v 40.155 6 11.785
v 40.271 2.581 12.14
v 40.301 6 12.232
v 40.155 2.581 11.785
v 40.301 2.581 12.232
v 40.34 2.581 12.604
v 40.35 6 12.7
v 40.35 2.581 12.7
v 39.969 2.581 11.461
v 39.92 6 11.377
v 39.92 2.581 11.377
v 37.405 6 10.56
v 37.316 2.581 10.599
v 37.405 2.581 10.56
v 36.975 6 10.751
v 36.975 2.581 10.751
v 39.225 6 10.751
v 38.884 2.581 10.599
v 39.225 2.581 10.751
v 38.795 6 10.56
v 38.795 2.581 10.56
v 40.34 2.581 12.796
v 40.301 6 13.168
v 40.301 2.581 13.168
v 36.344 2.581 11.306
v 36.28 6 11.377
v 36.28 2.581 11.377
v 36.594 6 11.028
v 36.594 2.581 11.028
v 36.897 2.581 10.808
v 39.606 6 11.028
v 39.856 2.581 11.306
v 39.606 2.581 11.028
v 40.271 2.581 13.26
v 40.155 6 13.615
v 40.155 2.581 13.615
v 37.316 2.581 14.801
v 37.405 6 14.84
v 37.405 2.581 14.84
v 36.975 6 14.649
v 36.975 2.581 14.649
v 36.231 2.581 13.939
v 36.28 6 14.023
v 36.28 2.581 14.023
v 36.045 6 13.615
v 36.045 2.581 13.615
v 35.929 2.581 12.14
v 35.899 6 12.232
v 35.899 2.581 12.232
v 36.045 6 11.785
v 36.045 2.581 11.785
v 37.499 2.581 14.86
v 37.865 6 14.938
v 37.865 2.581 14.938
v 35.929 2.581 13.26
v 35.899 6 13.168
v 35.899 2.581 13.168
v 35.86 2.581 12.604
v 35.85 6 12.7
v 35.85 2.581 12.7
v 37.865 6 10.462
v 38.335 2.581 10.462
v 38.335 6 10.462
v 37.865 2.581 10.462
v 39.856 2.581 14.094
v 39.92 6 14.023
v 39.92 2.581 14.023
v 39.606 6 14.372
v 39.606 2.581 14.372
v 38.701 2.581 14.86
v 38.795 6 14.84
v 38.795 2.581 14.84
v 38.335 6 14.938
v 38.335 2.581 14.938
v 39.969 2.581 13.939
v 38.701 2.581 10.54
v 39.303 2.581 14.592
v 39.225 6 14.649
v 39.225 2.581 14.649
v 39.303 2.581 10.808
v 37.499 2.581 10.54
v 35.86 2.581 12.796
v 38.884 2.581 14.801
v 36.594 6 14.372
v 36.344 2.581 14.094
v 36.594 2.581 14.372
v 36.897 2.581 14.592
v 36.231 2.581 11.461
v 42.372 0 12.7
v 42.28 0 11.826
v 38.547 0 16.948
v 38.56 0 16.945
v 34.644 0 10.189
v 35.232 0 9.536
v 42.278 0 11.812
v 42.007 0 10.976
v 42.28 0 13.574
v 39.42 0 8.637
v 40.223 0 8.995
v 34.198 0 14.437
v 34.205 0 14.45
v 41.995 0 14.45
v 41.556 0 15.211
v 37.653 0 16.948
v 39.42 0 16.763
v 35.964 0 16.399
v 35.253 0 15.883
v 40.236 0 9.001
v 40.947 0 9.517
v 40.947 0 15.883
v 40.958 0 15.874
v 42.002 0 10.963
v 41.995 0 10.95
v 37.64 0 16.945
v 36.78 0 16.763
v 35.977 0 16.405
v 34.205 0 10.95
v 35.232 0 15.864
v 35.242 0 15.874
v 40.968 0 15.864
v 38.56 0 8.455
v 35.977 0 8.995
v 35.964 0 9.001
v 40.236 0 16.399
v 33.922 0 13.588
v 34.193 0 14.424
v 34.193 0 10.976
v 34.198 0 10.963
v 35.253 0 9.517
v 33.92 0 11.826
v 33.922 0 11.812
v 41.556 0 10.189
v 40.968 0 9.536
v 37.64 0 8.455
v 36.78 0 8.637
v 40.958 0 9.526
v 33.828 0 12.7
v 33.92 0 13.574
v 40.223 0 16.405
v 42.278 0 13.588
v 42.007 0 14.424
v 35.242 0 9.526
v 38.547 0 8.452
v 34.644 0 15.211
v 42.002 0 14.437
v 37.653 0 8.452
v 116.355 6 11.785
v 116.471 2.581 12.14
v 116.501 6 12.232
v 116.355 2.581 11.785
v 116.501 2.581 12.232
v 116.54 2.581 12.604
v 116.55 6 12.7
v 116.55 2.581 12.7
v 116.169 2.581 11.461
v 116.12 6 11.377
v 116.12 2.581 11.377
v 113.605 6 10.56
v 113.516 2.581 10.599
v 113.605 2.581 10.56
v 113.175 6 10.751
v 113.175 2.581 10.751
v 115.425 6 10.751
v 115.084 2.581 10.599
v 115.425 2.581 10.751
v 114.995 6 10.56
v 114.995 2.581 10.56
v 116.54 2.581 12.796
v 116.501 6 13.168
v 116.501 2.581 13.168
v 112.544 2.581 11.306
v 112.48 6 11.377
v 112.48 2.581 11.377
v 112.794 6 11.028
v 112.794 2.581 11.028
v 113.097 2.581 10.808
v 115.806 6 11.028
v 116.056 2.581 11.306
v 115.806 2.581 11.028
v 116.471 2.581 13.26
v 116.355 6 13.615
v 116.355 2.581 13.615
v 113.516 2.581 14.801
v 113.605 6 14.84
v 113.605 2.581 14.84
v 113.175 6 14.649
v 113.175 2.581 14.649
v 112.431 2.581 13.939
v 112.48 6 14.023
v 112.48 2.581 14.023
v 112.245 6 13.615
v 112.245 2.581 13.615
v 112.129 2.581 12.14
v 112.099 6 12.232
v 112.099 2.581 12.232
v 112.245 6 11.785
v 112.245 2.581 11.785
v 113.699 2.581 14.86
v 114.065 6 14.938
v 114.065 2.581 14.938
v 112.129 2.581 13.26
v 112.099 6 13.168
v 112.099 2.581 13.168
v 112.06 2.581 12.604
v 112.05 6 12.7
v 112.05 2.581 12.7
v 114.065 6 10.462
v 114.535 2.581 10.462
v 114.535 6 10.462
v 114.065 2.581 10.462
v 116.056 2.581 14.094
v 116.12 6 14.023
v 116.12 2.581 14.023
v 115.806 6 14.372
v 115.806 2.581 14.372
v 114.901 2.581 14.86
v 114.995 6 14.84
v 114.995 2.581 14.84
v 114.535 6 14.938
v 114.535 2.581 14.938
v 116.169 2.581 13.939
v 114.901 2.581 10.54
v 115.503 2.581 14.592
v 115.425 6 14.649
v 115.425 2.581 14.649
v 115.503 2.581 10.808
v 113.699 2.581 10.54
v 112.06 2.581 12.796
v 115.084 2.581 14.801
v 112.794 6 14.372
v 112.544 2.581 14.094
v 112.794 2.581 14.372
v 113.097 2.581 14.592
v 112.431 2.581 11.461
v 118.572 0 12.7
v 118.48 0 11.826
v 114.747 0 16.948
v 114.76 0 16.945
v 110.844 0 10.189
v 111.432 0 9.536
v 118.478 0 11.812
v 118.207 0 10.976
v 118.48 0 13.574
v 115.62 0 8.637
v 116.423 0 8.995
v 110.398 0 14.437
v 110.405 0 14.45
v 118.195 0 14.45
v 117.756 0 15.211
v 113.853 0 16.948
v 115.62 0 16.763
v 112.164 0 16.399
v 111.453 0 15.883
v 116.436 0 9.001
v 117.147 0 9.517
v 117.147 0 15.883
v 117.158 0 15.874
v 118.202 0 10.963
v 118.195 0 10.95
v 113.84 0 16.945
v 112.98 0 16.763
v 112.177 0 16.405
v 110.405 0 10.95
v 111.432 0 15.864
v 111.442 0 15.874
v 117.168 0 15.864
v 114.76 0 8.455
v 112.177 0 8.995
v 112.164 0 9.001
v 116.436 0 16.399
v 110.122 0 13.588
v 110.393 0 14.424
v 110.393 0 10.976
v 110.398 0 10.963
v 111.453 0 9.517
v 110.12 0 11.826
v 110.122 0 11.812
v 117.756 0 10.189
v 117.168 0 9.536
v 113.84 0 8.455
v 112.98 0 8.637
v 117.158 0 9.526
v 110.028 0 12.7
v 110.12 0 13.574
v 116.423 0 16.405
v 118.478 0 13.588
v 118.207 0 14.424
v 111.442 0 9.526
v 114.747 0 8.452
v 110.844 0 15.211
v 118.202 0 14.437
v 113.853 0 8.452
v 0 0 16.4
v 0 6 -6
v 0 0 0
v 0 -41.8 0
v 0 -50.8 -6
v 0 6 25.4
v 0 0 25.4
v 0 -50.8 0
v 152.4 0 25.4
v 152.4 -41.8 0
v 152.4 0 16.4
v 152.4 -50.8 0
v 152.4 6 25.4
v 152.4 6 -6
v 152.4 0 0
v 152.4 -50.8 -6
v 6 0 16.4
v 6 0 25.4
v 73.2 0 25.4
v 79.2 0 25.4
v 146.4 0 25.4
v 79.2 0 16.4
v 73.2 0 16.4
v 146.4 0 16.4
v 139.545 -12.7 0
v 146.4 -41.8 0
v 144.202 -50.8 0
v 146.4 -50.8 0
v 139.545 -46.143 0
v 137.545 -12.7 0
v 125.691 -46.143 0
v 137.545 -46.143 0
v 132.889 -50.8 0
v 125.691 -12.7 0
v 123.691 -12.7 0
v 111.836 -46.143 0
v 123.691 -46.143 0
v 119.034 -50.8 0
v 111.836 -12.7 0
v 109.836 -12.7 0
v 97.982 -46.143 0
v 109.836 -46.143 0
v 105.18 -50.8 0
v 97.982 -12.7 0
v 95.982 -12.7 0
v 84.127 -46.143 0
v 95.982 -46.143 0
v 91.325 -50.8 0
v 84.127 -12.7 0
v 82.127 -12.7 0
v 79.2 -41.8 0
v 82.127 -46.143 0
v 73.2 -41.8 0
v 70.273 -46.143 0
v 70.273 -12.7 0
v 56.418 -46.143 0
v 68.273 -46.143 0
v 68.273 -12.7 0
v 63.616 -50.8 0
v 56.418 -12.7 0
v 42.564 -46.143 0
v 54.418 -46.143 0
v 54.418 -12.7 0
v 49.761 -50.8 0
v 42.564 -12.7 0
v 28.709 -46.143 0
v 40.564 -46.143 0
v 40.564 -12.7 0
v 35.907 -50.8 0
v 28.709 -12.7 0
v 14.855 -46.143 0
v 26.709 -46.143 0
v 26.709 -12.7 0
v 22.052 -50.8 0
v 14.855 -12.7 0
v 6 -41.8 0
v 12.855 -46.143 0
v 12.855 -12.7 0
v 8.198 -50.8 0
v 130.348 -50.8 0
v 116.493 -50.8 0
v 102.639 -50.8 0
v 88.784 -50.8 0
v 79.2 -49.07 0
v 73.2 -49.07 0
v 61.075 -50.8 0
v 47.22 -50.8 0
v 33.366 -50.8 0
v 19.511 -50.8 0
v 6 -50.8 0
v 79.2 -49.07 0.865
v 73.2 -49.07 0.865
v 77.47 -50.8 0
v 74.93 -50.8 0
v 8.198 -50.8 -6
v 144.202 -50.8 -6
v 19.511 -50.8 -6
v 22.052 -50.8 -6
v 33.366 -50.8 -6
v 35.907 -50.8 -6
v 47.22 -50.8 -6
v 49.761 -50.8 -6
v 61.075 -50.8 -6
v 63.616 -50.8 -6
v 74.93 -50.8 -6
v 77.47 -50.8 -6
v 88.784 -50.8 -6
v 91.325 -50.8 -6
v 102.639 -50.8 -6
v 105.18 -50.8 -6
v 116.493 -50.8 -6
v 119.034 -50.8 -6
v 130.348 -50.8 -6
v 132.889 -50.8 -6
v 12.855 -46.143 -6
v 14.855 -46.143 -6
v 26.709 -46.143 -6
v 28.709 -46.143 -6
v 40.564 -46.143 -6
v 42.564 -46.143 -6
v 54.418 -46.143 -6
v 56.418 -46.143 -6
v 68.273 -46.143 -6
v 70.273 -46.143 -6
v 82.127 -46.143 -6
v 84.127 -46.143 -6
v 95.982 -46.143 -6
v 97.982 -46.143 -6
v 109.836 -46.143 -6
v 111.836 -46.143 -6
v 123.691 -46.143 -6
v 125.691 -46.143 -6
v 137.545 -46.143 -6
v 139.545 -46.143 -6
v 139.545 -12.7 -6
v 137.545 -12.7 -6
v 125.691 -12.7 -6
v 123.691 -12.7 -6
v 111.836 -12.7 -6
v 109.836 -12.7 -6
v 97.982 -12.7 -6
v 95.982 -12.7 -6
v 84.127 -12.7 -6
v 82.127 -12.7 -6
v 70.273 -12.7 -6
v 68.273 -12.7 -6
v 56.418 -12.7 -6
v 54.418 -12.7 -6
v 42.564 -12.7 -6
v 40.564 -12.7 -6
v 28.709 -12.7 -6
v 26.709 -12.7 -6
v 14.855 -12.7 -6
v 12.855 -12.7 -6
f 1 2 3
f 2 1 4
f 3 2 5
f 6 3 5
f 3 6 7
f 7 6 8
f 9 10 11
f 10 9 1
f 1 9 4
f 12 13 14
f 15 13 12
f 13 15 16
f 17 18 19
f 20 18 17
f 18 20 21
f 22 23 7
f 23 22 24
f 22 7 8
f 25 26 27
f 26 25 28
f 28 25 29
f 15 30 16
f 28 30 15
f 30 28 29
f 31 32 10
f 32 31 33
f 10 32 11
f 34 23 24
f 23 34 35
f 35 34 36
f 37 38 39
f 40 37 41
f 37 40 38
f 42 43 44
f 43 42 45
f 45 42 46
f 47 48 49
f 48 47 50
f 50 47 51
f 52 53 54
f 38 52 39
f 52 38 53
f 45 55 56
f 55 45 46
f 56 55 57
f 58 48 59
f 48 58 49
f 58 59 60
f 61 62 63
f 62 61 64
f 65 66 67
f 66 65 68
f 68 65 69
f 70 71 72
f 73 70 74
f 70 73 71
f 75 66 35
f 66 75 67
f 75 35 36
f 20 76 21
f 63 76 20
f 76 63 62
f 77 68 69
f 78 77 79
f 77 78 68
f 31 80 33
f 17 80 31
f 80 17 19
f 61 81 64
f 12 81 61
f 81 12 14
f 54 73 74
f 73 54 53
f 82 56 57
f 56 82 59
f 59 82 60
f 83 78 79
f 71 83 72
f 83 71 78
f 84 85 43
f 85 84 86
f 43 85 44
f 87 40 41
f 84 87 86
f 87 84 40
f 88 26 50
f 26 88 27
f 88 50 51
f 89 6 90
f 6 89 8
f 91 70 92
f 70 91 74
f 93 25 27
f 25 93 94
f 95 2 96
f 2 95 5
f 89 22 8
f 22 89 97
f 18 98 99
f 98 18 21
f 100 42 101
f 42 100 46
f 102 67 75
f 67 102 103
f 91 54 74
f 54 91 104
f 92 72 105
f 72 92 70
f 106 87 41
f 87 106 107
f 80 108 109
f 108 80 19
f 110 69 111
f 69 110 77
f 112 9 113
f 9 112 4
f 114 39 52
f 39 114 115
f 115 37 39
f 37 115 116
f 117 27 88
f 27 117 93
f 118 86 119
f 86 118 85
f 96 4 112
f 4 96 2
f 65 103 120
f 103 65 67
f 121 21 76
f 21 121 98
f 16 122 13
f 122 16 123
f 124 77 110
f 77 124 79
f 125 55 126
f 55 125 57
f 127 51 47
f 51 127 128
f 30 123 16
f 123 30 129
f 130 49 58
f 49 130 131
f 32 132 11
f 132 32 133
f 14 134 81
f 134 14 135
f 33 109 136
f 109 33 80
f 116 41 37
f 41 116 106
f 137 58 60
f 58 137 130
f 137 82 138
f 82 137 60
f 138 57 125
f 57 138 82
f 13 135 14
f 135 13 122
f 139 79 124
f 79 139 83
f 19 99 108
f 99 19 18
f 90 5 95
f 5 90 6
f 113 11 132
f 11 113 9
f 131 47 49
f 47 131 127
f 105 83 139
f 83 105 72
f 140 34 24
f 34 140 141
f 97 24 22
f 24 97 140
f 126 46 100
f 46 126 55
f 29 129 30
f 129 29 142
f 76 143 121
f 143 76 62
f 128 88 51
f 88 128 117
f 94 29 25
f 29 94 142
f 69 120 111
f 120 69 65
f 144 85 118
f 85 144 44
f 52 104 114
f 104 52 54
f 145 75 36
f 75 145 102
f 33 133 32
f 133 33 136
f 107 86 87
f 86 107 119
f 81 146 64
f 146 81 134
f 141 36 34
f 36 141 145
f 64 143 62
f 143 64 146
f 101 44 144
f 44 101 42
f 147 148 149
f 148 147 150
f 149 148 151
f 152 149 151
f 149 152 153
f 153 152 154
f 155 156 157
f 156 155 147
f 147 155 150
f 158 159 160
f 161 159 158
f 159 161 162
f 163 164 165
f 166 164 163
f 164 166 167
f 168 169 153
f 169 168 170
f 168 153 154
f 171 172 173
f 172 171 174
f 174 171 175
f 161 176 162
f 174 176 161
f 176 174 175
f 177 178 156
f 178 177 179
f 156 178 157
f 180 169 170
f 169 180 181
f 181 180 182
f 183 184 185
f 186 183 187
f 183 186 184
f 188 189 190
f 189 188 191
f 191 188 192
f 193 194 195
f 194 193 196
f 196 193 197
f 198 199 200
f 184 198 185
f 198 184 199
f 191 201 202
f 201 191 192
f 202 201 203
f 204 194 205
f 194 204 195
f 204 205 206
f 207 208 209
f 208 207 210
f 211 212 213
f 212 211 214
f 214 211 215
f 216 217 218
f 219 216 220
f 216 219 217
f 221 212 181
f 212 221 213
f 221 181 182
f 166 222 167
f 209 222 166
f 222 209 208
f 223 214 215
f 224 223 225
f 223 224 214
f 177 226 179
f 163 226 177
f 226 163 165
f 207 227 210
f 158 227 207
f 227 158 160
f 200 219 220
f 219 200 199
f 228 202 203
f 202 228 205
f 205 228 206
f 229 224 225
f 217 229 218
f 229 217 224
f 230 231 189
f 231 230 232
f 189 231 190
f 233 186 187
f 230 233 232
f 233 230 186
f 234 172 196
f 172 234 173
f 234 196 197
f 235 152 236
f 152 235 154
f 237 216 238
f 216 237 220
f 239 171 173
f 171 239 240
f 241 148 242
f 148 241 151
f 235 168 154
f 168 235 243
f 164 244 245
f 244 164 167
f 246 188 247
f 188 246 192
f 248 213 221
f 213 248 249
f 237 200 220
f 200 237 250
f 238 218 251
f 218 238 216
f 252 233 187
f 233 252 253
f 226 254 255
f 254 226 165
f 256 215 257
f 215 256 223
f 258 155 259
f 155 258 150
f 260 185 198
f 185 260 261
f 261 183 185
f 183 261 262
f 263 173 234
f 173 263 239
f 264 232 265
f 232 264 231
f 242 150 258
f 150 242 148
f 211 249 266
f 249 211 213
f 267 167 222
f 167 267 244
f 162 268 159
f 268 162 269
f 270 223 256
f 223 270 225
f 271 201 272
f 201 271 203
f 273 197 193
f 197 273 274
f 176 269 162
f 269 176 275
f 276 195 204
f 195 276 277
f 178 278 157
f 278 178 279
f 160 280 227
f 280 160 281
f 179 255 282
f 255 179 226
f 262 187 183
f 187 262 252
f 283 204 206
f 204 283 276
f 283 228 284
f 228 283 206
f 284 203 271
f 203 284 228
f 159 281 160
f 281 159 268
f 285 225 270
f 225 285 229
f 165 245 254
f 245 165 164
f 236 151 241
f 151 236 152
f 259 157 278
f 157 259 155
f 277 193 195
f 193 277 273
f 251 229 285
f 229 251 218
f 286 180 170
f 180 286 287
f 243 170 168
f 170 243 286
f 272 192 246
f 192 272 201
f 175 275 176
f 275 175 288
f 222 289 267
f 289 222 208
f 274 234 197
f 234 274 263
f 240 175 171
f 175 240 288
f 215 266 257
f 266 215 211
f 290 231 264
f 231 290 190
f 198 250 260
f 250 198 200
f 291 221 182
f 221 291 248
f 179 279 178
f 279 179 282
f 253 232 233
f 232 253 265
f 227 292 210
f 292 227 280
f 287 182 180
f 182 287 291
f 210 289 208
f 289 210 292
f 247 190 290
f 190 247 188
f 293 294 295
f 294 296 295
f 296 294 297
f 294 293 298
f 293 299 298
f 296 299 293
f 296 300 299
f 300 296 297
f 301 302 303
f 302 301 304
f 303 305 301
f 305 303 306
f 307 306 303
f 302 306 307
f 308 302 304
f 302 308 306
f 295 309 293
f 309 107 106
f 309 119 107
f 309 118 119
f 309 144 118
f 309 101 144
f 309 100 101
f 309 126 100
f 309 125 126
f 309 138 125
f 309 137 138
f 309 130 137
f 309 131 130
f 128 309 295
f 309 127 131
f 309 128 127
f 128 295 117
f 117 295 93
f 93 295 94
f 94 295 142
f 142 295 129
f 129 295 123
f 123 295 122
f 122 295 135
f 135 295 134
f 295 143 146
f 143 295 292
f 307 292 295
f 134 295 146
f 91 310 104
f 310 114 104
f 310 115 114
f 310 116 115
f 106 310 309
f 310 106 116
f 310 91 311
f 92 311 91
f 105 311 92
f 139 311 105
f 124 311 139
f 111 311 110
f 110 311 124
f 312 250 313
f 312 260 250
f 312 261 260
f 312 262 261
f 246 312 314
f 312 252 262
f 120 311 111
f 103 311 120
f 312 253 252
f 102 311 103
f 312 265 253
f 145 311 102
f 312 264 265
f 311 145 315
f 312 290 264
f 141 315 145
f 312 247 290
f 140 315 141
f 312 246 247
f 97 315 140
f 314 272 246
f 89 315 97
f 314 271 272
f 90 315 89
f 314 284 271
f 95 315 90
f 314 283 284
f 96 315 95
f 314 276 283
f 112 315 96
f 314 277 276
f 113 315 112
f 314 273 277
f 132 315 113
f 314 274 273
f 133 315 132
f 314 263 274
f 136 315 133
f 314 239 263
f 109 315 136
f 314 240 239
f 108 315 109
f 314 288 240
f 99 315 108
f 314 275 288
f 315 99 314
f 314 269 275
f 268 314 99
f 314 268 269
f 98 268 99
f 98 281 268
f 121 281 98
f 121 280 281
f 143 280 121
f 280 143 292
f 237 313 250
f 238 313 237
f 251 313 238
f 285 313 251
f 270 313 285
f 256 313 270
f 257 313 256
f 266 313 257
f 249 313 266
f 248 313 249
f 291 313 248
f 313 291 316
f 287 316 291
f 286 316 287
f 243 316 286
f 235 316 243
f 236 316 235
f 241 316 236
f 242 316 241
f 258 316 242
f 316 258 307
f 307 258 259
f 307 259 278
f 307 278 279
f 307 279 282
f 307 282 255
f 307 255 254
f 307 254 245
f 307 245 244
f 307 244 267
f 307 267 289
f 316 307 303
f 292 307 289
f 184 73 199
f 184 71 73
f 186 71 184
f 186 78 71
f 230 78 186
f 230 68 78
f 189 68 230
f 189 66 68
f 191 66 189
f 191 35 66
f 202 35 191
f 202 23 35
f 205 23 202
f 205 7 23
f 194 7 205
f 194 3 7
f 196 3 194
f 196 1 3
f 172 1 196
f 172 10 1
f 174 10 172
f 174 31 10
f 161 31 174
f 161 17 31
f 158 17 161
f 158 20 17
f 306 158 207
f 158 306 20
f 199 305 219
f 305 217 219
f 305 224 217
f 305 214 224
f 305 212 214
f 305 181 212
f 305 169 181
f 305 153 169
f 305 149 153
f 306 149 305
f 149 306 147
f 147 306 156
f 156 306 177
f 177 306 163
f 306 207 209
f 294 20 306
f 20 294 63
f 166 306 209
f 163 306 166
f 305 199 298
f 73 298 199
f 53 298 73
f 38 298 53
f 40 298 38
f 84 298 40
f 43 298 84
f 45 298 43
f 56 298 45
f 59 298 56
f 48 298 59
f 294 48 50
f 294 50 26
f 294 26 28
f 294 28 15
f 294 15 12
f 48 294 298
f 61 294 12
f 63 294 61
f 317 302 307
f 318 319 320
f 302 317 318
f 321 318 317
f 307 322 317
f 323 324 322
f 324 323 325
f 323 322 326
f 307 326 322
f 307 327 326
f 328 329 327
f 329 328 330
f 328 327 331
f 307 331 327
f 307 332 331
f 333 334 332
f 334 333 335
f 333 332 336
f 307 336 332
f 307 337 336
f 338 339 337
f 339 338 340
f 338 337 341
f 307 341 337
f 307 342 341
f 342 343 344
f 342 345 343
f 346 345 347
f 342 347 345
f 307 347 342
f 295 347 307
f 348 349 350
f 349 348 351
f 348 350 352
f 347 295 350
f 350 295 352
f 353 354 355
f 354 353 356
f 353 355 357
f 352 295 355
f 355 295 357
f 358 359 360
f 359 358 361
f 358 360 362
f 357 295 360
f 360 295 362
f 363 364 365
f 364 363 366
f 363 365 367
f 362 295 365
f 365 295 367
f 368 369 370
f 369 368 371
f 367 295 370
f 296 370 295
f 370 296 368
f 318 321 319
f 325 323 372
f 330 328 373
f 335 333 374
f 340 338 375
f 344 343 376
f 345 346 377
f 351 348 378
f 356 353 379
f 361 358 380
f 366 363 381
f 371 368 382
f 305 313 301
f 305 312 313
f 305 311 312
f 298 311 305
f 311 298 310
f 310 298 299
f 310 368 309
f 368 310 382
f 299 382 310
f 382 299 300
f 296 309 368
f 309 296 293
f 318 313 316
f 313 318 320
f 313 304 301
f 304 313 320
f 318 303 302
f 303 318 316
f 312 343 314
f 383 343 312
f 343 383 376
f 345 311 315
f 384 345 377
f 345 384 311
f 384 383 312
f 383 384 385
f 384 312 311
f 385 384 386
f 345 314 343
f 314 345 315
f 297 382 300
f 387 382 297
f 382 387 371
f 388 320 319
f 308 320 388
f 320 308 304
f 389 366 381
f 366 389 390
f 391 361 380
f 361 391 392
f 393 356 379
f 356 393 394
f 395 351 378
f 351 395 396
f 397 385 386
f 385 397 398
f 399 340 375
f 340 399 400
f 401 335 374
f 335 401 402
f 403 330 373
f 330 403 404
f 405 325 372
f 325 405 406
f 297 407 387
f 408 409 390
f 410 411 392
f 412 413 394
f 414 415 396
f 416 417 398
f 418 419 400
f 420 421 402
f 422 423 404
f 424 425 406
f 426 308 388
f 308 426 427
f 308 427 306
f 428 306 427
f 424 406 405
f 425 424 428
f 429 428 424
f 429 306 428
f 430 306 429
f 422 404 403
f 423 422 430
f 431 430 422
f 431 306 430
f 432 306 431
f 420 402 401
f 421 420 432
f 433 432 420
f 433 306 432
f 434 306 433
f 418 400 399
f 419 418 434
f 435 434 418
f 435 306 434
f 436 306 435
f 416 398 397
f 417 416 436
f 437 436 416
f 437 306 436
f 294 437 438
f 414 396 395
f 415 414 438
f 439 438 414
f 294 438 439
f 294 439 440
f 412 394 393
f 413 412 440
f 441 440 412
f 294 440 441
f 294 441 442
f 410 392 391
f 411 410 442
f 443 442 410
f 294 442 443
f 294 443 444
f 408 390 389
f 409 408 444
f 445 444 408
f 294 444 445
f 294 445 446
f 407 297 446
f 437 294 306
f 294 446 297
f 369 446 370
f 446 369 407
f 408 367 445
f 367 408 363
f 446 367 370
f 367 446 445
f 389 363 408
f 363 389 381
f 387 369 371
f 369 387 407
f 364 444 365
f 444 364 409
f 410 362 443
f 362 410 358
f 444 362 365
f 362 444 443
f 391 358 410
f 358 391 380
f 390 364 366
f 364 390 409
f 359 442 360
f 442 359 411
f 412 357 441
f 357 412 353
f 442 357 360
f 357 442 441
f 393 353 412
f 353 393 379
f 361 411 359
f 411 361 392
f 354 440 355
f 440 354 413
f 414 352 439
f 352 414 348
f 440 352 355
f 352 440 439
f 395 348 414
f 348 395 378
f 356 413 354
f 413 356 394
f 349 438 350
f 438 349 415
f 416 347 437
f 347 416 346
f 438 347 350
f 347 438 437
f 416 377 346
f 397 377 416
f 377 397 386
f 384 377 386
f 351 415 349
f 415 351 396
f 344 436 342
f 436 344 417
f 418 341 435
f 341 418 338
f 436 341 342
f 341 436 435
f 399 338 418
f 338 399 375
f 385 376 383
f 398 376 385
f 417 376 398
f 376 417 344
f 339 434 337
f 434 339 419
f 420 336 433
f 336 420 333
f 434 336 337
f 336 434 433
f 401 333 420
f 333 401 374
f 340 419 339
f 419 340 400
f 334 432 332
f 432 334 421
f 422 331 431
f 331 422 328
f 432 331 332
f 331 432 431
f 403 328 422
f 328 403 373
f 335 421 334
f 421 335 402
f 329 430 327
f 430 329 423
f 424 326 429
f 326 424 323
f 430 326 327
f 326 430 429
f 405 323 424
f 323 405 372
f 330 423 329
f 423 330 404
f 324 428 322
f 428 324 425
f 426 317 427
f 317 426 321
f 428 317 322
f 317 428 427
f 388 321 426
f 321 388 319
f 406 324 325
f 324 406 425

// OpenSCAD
// file: ../screws.scad
module screw_hole(
    length,
    r       = 4.5/2,
    head_od = 8.7,
    head_id = 4.0,
    head_h  = 3) {

  cylinder(r=r, h=length);
  cylinder(r1=head_od/2, r2=head_id/2, h=head_h);
}
// file: ../support.scad
module linear_support(y, z, d, w) {
  points = [
    [  0,  0,  0   ], // 0
    [  w,  0,  0   ], // 1
    [  w,  d,  0   ], // 2
    [  0,  d,  0   ], // 3
    [  0,  y,  z   ], // 4
    [  w,  y,  z   ], // 5
    [  w,  y,  z-d ], // 6
    [  0,  y,  z-d ]  // 7
  ];

  polyhedron(points, [
    [0,1,2,3], // bottom
    [4,5,1,0], // front
    [7,6,5,4], // top
    [5,6,2,1], // right
    [6,7,3,2], // back
    [7,4,0,3]  // left
  ]);
}
// main file
$fn = 30;

use <../support.scad>;
use <../screws.scad>;

inches = 25.4;

holder_w = 6;
holder_x = 6 * inches;
holder_y = 1 * inches;
holder_z = 2 * inches;

slot_n = 10;
slot_d = 2;
slot_z = holder_z - (0.5 * inches);

support_d = 9;

// /////////////////////////////////////////////////////////////////////////////
// Backplate
module backplate() {
  difference() {
    rotate([90, 0, 0])
    translate([0, 0, -holder_w])
    cube([holder_x, holder_y, holder_w]);

    translate([holder_x*0.25, -0.1, holder_y/2])
    rotate([-90, 0, 0])
    screw_hole(20);

    translate([holder_x*0.75, -0.1, holder_y/2])
    rotate([-90, 0, 0])
    screw_hole(20);
  }
}

// /////////////////////////////////////////////////////////////////////////////
// Frontplate
module frontplate() {
  rotate([90, 0, 0])
  translate([0, -holder_w, -holder_w])
  cube([holder_x, holder_w, holder_z+holder_w]);
}

// /////////////////////////////////////////////////////////////////////////////
// Cable slots
module slot() {
  chamfer_d = slot_d*4;

  rotate([90, 0, 0])
  translate([-slot_d/2, -holder_w-1, holder_z-slot_z])
  cube([slot_d, holder_w+2, slot_z+1]);

  // chamfer
  rotate([90, 0, 0])
  translate([0, 0, holder_z])
  rotate([0, 45, 0])
  translate([-chamfer_d/2, -holder_w-1, -chamfer_d/2])
  cube([chamfer_d, holder_w+2, chamfer_d]);
}

module slots() {
  for(i = [1 : slot_n]) {
    slot_spacing = holder_x / (slot_n + 1);

    translate([slot_spacing*i, 0, 0])
    slot();
  }
}

// /////////////////////////////////////////////////////////////////////////////
// Supports
module supports() {
  // left support
  translate([0, -holder_z, 0])
  linear_support(
    y = holder_z,
    z = holder_y,
    w = holder_w,
    d = support_d);

  // Right support
  translate([holder_x-holder_w, -holder_z, 0])
  linear_support(
    y = holder_z,
    z = holder_y,
    w = holder_w,
    d = support_d);

  // Center support
  translate([(holder_x-holder_w)/2, -holder_z, 0])
  linear_support(
    y = holder_z,
    z = holder_y,
    w = holder_w,
    d = support_d);
}

// /////////////////////////////////////////////////////////////////////////////
// Part
difference() {
  union() {
    frontplate();
    backplate();
    supports();
  }
  slots();
}
